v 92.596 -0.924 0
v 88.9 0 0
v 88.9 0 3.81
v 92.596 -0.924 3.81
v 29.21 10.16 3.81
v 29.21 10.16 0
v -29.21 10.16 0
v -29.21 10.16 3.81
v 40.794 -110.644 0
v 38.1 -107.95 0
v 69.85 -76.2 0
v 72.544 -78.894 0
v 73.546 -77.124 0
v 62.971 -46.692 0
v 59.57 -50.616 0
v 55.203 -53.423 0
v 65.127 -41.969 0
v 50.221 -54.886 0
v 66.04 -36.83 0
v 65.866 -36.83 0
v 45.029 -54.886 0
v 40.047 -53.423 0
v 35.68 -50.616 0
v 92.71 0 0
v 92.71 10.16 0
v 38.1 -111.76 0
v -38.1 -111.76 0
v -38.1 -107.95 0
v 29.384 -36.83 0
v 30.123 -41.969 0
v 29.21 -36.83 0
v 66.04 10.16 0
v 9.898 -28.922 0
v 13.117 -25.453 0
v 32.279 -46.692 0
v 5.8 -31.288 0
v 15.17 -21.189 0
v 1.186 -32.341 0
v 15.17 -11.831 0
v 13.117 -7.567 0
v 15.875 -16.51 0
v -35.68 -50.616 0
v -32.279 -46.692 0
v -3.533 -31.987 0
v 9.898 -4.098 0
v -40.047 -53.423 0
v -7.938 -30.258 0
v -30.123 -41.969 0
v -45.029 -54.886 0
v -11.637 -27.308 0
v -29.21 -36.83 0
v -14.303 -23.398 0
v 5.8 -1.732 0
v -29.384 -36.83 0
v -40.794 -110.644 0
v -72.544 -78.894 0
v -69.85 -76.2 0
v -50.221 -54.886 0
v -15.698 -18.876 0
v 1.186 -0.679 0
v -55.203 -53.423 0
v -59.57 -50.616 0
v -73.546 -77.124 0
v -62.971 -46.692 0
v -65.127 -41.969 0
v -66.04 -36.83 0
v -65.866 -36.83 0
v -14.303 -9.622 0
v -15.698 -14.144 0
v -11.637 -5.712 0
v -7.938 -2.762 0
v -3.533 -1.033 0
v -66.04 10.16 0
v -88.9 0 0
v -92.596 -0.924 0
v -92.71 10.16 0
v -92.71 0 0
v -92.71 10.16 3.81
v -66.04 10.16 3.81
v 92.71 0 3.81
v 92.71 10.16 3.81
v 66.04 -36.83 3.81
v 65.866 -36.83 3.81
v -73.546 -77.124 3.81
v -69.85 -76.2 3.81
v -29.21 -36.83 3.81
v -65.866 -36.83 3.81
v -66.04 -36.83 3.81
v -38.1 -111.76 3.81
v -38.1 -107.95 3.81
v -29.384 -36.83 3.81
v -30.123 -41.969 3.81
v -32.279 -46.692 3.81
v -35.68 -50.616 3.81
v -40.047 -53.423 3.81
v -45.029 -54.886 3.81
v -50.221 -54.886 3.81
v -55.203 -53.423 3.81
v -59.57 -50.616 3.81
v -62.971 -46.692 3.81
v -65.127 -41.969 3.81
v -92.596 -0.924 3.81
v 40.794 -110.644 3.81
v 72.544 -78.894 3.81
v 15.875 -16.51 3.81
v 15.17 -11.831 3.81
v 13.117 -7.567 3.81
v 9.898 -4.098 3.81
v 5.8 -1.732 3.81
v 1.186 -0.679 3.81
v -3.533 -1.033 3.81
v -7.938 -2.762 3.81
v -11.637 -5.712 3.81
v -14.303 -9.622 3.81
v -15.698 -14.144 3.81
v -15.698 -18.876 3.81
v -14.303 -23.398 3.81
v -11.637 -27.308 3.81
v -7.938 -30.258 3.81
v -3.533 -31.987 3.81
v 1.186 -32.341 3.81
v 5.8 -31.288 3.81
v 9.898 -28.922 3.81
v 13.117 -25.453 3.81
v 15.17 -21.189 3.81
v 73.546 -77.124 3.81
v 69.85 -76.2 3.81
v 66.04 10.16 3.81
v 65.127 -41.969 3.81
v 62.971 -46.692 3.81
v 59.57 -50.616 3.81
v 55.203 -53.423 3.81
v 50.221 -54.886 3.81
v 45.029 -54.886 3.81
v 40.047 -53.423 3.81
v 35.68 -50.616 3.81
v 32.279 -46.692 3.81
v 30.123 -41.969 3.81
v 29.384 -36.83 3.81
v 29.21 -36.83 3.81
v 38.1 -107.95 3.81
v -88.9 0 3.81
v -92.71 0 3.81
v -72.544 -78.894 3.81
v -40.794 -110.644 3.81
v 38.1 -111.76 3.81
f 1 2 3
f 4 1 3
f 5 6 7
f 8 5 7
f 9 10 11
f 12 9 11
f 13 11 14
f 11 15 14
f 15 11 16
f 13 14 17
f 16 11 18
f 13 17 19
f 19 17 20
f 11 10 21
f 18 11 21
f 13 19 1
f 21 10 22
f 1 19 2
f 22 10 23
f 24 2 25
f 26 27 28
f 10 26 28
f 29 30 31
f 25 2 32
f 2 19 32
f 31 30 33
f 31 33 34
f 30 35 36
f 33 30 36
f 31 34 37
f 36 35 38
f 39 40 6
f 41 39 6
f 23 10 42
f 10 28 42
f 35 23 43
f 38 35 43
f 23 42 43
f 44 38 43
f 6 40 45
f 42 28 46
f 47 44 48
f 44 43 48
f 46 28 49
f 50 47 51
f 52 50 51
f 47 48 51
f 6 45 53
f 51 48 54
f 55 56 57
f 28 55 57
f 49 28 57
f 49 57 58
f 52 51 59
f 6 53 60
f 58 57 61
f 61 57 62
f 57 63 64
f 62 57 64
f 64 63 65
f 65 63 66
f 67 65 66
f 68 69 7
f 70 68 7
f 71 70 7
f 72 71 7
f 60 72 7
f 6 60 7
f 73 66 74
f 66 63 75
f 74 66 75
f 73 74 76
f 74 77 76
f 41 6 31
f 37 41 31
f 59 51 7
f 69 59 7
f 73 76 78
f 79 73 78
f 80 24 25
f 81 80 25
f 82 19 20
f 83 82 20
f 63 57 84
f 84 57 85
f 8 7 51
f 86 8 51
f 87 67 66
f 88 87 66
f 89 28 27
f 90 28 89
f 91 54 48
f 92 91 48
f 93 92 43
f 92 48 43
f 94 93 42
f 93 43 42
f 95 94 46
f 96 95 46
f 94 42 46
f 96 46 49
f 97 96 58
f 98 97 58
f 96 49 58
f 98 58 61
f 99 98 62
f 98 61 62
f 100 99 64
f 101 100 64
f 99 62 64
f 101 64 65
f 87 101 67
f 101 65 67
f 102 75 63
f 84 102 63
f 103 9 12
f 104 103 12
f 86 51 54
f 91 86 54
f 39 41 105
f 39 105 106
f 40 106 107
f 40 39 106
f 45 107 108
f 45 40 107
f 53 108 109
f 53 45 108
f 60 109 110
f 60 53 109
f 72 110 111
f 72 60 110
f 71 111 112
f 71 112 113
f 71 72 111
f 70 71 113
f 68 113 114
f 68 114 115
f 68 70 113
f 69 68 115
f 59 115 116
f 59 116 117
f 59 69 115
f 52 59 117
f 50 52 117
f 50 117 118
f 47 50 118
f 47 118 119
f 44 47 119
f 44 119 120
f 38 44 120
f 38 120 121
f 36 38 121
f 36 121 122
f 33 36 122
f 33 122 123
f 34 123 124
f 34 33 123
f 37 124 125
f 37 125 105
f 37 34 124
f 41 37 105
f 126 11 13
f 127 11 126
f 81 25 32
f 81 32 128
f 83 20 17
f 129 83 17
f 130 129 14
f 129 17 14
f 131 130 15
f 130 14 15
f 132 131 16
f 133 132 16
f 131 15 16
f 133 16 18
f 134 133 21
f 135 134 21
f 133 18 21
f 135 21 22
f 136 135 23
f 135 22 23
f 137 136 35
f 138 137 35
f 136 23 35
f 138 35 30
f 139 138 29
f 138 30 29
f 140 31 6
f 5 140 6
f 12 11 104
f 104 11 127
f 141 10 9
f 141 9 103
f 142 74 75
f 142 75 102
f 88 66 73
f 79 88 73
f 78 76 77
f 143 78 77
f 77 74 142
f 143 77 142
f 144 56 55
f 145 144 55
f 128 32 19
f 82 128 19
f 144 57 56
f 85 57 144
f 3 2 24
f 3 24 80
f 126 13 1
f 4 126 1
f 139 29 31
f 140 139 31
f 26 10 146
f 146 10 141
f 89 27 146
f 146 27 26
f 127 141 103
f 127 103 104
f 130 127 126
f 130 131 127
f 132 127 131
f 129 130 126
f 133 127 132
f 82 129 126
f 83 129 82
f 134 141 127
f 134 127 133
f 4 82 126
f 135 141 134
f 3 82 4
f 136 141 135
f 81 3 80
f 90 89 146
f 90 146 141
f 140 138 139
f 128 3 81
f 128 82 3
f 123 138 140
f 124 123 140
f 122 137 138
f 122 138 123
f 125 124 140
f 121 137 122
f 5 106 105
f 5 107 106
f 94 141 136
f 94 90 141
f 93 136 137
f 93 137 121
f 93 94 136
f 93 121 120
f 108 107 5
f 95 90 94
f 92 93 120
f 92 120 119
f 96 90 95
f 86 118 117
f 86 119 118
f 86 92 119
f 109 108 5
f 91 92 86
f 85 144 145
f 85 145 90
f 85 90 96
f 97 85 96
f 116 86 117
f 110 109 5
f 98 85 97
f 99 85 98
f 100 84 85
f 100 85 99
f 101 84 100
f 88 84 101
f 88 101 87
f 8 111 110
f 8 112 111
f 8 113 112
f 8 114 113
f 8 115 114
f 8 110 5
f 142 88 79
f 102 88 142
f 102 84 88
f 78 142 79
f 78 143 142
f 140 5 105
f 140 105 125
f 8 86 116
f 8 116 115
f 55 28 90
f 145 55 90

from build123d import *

# Parameters (mm, degrees)
F0_R      = 15.875
F1_DEPTH  = 3.81
F3_DEPTH  = 40.64
F4_DEPTH  = 3.81
F5_DEPTH  = 3.81
F6_DEPTH  = 3.81
F7_DEPTH  = 3.81
F8_DEPTH  = 3.81
F9_DEPTH  = 3.81
F10_DEPTH = 3.81


with BuildPart() as f1:
    # F0 (on Top) → F1 (new body)
    with BuildSketch(Plane.XY):
        with BuildLine():
            Line((-66.04, 50.8), (-88.9, 50.8))
            Line((-88.9, 50.8), (-88.9, 0))
            Line((-88.9, 0), (-69.85, -76.2))
            Line((-69.85, -76.2), (-38.1, -107.95))
            Line((-38.1, -107.95), (0, -107.95))
            Line((0, -107.95), (38.1, -107.95))
            Line((38.1, -107.95), (69.85, -76.2))
            Line((69.85, -76.2), (88.9, 0))
            Line((88.9, 0), (88.9, 50.8))
            Line((88.9, 50.8), (66.04, 50.8))
            Line((66.04, 50.8), (66.04, 1.27))
            Line((66.04, 1.27), (66.04, -36.83))
            Line((66.04, -36.83), (65.8662626902, -36.83))
            ThreePointArc((65.8662626902, -36.83), (47.625, -55.0712626902), (29.3837373098, -36.83))
            Line((29.3837373098, -36.83), (29.21, -36.83))
            Line((29.21, -36.83), (29.21, 1.27))
            Line((29.21, 1.27), (29.21, 50.8))
            Line((29.21, 50.8), (0, 50.8))
            Line((0, 50.8), (-29.21, 50.8))
            Line((-29.21, 50.8), (-29.21, 1.27))
            Line((-29.21, 1.27), (-29.21, -36.83))
            Line((-29.21, -36.83), (-29.3837373098, -36.83))
            ThreePointArc((-29.3837373098, -36.83), (-47.625, -55.0712626902), (-65.8662626902, -36.83))
            Line((-65.8662626902, -36.83), (-66.04, -36.83))
            Line((-66.04, -36.83), (-66.04, 1.27))
            Line((-66.04, 1.27), (-66.04, 50.8))
        make_face()
        with Locations((0, -16.51)):
            Circle(F0_R, mode=Mode.SUBTRACT)
    extrude(amount=F1_DEPTH)

    # F2: F1 across plane


with BuildPart() as f1_1:
    add(f1.part)
    add(f1.part.mirror(Plane.YZ), mode=Mode.INTERSECT)

    # F3 (cut): faces of the model
    f3_faces = [f1_1.faces().sort_by_distance(p)[0] for p in [
        (0, 50.8, 1.905),
        (77.47, 50.8, 1.905),
        (-77.47, 50.8, 1.905),
    ]]
    extrude(f3_faces, amount=-F3_DEPTH, mode=Mode.SUBTRACT)

    # F4 (add): a face of the model
    f4_faces = [f1_1.faces().sort_by_distance(p)[0] for p in [
        (0, -107.95, 1.905),
    ]]
    extrude(f4_faces, amount=F4_DEPTH)

    # F5 (add): a face of the model
    f5_faces = [f1_1.faces().sort_by_distance(p)[0] for p in [
        (-53.975, -92.075, 1.905),
    ]]
    extrude(f5_faces, amount=F5_DEPTH)

    # F6 (add): a face of the model
    f6_faces = [f1_1.faces().sort_by_distance(p)[0] for p in [
        (-79.375, -38.1, 1.905),
    ]]
    extrude(f6_faces, amount=F6_DEPTH)

    # F7 (add): a face of the model
    f7_faces = [f1_1.faces().sort_by_distance(p)[0] for p in [
        (-88.9, 5.08, 1.905),
    ]]
    extrude(f7_faces, amount=F7_DEPTH)

    # F8 (add): a face of the model
    f8_faces = [f1_1.faces().sort_by_distance(p)[0] for p in [
        (53.975, -92.075, 1.905),
    ]]
    extrude(f8_faces, amount=F8_DEPTH)

    # F9 (add): a face of the model
    f9_faces = [f1_1.faces().sort_by_distance(p)[0] for p in [
        (79.375, -38.1, 1.905),
    ]]
    extrude(f9_faces, amount=F9_DEPTH)

    # F10 (add): a face of the model
    f10_faces = [f1_1.faces().sort_by_distance(p)[0] for p in [
        (88.9, 5.08, 1.905),
    ]]
    extrude(f10_faces, amount=F10_DEPTH)


solid = f1_1.part
